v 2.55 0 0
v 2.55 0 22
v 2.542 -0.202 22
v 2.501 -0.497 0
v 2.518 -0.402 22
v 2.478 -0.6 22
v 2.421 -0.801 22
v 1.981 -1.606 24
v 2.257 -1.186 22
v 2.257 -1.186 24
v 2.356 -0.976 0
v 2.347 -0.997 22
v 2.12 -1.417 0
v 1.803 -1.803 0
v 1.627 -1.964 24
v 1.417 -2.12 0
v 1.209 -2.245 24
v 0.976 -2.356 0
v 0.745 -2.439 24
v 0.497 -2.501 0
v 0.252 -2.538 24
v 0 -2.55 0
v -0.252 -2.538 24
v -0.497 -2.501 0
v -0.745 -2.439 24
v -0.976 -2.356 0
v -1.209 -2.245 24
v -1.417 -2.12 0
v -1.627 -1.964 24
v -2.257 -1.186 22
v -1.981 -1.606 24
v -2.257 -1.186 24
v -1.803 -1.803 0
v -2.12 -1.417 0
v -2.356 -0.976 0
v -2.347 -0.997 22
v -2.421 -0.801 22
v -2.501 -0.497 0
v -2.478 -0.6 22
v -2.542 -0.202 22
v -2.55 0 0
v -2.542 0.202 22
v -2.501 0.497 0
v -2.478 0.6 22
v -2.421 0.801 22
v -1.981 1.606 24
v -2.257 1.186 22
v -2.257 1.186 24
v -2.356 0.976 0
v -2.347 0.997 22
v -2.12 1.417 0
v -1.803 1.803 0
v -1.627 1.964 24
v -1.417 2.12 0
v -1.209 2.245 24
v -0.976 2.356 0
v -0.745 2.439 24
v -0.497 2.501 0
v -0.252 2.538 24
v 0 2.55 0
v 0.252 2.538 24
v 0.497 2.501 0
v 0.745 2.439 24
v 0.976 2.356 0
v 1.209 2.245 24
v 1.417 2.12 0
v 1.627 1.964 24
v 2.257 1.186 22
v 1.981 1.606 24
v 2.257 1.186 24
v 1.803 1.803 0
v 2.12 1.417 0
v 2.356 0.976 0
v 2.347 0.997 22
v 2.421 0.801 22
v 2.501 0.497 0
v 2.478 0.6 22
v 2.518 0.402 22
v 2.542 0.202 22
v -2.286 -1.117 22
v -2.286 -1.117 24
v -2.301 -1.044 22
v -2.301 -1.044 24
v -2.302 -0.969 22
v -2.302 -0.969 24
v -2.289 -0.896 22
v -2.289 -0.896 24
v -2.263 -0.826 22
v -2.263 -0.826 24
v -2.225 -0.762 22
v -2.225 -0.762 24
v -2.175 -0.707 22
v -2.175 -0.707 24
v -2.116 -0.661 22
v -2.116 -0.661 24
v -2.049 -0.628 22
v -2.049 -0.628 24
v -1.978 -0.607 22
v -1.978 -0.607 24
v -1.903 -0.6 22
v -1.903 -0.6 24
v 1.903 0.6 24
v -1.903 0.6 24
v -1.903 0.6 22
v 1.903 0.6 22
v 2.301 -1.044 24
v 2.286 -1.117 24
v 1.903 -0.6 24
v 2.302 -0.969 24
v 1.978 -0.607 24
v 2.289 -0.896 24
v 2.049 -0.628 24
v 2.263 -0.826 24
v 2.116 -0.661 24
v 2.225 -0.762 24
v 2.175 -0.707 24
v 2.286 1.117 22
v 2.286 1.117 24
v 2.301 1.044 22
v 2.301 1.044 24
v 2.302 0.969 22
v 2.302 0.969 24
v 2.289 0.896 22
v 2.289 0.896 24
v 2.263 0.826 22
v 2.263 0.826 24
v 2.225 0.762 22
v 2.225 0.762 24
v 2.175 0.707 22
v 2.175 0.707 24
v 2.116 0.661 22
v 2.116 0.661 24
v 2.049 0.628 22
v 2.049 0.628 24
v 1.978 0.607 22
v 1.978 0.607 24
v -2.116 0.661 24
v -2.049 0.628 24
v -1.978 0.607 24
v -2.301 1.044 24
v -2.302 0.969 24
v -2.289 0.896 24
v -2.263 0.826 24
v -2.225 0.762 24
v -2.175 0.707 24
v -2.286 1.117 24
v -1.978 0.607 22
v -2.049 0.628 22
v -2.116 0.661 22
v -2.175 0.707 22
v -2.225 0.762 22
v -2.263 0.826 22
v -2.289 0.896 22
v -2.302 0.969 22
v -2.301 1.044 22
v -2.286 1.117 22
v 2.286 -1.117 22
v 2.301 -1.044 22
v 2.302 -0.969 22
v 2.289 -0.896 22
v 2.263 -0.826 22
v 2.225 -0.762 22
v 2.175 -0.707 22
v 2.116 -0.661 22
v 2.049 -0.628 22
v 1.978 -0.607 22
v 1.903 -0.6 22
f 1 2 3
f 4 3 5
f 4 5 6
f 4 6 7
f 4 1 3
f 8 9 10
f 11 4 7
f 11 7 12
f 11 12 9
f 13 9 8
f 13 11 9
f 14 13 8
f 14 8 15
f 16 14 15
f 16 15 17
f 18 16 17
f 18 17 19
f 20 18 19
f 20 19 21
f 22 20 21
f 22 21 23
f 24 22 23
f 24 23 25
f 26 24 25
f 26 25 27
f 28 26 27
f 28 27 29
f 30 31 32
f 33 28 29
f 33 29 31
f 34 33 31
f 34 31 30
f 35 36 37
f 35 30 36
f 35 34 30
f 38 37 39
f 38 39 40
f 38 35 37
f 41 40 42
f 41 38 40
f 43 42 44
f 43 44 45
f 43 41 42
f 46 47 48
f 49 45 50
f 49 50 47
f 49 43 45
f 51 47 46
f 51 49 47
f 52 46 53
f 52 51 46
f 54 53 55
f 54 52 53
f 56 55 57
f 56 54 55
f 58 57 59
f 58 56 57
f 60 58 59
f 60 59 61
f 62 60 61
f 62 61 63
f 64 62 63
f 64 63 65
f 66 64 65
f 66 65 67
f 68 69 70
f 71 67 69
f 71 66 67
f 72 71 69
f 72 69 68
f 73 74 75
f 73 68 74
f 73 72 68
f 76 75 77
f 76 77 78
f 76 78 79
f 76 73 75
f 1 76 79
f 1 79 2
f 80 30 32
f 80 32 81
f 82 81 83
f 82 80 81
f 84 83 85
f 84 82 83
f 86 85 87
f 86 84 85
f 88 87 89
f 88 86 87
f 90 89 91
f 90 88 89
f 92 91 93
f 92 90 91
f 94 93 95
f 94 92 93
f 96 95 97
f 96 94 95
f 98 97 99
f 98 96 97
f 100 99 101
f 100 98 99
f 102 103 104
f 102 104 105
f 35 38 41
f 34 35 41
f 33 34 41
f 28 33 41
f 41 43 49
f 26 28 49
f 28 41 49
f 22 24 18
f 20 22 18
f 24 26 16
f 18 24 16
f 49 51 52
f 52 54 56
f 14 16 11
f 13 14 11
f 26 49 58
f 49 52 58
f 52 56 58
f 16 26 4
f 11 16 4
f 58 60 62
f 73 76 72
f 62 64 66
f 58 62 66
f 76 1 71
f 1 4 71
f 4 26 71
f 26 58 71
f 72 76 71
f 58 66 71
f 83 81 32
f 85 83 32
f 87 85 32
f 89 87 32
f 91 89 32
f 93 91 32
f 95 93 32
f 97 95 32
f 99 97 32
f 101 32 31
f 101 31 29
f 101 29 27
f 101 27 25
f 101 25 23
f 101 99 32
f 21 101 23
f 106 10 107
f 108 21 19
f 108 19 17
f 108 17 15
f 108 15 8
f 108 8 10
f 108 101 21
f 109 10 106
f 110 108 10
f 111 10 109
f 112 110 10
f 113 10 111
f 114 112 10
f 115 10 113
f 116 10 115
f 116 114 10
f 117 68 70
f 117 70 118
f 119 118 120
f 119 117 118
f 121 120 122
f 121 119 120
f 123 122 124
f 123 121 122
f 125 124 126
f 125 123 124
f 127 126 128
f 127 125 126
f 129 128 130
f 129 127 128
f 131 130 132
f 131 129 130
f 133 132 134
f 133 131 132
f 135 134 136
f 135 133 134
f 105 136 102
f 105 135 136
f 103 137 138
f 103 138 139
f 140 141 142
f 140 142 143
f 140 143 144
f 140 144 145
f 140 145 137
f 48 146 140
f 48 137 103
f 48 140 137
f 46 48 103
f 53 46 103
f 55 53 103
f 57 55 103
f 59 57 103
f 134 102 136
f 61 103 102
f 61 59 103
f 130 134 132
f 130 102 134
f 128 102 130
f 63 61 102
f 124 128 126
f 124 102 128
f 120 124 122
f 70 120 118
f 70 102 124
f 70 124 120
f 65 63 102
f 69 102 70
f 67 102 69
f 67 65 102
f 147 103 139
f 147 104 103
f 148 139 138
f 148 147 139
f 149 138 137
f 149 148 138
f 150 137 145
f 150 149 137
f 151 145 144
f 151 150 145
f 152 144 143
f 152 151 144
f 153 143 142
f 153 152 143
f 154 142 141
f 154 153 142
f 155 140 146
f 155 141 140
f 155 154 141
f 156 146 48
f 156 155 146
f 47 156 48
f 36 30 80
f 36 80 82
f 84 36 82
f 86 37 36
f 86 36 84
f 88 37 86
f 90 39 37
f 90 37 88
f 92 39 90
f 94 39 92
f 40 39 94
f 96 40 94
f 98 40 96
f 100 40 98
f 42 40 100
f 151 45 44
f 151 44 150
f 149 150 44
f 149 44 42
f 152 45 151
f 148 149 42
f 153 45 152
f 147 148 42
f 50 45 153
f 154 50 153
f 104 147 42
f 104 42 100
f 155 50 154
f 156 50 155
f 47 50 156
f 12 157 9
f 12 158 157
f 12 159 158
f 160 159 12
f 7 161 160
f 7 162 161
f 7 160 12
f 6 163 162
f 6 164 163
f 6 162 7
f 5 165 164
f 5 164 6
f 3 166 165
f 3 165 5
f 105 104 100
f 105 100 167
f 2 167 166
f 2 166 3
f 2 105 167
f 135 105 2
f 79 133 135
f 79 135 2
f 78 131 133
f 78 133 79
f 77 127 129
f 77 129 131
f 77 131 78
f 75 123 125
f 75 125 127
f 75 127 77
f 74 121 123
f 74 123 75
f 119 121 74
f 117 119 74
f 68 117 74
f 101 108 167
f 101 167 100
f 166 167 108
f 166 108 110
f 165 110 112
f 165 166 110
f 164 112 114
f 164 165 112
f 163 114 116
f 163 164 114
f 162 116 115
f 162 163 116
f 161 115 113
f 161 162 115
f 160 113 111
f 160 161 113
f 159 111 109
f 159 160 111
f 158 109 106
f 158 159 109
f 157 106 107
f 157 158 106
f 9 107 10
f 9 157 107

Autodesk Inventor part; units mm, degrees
ref_plane "YZ Plane" through (0, 0, 0) normal (1, 0, 0) x (0, 1, 0)
ref_plane "XZ Plane" through (0, 0, 0) normal (0, 1, 0) x (-1, 0, 0)
ref_plane "XY Plane" through (0, 0, 0) normal (0, 0, 1) x (1, 0, 0)
sketch "Эскиз1" plane through (0, 0, 0) normal (0, 0, 1) x (1, 0, 0)
  circle A0 centre (0, 0) radius 2.55
  dimension "d0" = 5.1
extrude "Выдавливание1" add sketch "Эскиз1" along normal blind 24
sketch "Эскиз2" plane through (0, 0, 24) normal (0, 0, 1) x (1, 0, 0)
  line L0 (2.55, -0.6) -> (-2.55, -0.6)
  line L1 (-2.55, -0.6) -> (-2.55, 0.6)
  line L2 (-2.55, 0.6) -> (2.55, 0.6)
  line L3 (2.55, 0.6) -> (2.55, -0.6)
  line L4 (2.55, -0.6) -> (-2.55, 0.6) construction
  line L5 (-2.55, -0.6) -> (2.55, 0.6) construction
  circle A0 centre (0, 0) radius 2.55 construction
  point P0 (0, 0)
  dimension "d3" = 1.2
extrude "Выдавливание2" cut sketch "Эскиз2" against normal blind 2
fillet "Сопряжение1" radius 0.4 4 edges at (2.4784, 0.6, 23) (-2.4784, 0.6, 23) (-2.4784, -0.6, 23) (2.4784, -0.6, 23)
properties part number "Шпунтик"
